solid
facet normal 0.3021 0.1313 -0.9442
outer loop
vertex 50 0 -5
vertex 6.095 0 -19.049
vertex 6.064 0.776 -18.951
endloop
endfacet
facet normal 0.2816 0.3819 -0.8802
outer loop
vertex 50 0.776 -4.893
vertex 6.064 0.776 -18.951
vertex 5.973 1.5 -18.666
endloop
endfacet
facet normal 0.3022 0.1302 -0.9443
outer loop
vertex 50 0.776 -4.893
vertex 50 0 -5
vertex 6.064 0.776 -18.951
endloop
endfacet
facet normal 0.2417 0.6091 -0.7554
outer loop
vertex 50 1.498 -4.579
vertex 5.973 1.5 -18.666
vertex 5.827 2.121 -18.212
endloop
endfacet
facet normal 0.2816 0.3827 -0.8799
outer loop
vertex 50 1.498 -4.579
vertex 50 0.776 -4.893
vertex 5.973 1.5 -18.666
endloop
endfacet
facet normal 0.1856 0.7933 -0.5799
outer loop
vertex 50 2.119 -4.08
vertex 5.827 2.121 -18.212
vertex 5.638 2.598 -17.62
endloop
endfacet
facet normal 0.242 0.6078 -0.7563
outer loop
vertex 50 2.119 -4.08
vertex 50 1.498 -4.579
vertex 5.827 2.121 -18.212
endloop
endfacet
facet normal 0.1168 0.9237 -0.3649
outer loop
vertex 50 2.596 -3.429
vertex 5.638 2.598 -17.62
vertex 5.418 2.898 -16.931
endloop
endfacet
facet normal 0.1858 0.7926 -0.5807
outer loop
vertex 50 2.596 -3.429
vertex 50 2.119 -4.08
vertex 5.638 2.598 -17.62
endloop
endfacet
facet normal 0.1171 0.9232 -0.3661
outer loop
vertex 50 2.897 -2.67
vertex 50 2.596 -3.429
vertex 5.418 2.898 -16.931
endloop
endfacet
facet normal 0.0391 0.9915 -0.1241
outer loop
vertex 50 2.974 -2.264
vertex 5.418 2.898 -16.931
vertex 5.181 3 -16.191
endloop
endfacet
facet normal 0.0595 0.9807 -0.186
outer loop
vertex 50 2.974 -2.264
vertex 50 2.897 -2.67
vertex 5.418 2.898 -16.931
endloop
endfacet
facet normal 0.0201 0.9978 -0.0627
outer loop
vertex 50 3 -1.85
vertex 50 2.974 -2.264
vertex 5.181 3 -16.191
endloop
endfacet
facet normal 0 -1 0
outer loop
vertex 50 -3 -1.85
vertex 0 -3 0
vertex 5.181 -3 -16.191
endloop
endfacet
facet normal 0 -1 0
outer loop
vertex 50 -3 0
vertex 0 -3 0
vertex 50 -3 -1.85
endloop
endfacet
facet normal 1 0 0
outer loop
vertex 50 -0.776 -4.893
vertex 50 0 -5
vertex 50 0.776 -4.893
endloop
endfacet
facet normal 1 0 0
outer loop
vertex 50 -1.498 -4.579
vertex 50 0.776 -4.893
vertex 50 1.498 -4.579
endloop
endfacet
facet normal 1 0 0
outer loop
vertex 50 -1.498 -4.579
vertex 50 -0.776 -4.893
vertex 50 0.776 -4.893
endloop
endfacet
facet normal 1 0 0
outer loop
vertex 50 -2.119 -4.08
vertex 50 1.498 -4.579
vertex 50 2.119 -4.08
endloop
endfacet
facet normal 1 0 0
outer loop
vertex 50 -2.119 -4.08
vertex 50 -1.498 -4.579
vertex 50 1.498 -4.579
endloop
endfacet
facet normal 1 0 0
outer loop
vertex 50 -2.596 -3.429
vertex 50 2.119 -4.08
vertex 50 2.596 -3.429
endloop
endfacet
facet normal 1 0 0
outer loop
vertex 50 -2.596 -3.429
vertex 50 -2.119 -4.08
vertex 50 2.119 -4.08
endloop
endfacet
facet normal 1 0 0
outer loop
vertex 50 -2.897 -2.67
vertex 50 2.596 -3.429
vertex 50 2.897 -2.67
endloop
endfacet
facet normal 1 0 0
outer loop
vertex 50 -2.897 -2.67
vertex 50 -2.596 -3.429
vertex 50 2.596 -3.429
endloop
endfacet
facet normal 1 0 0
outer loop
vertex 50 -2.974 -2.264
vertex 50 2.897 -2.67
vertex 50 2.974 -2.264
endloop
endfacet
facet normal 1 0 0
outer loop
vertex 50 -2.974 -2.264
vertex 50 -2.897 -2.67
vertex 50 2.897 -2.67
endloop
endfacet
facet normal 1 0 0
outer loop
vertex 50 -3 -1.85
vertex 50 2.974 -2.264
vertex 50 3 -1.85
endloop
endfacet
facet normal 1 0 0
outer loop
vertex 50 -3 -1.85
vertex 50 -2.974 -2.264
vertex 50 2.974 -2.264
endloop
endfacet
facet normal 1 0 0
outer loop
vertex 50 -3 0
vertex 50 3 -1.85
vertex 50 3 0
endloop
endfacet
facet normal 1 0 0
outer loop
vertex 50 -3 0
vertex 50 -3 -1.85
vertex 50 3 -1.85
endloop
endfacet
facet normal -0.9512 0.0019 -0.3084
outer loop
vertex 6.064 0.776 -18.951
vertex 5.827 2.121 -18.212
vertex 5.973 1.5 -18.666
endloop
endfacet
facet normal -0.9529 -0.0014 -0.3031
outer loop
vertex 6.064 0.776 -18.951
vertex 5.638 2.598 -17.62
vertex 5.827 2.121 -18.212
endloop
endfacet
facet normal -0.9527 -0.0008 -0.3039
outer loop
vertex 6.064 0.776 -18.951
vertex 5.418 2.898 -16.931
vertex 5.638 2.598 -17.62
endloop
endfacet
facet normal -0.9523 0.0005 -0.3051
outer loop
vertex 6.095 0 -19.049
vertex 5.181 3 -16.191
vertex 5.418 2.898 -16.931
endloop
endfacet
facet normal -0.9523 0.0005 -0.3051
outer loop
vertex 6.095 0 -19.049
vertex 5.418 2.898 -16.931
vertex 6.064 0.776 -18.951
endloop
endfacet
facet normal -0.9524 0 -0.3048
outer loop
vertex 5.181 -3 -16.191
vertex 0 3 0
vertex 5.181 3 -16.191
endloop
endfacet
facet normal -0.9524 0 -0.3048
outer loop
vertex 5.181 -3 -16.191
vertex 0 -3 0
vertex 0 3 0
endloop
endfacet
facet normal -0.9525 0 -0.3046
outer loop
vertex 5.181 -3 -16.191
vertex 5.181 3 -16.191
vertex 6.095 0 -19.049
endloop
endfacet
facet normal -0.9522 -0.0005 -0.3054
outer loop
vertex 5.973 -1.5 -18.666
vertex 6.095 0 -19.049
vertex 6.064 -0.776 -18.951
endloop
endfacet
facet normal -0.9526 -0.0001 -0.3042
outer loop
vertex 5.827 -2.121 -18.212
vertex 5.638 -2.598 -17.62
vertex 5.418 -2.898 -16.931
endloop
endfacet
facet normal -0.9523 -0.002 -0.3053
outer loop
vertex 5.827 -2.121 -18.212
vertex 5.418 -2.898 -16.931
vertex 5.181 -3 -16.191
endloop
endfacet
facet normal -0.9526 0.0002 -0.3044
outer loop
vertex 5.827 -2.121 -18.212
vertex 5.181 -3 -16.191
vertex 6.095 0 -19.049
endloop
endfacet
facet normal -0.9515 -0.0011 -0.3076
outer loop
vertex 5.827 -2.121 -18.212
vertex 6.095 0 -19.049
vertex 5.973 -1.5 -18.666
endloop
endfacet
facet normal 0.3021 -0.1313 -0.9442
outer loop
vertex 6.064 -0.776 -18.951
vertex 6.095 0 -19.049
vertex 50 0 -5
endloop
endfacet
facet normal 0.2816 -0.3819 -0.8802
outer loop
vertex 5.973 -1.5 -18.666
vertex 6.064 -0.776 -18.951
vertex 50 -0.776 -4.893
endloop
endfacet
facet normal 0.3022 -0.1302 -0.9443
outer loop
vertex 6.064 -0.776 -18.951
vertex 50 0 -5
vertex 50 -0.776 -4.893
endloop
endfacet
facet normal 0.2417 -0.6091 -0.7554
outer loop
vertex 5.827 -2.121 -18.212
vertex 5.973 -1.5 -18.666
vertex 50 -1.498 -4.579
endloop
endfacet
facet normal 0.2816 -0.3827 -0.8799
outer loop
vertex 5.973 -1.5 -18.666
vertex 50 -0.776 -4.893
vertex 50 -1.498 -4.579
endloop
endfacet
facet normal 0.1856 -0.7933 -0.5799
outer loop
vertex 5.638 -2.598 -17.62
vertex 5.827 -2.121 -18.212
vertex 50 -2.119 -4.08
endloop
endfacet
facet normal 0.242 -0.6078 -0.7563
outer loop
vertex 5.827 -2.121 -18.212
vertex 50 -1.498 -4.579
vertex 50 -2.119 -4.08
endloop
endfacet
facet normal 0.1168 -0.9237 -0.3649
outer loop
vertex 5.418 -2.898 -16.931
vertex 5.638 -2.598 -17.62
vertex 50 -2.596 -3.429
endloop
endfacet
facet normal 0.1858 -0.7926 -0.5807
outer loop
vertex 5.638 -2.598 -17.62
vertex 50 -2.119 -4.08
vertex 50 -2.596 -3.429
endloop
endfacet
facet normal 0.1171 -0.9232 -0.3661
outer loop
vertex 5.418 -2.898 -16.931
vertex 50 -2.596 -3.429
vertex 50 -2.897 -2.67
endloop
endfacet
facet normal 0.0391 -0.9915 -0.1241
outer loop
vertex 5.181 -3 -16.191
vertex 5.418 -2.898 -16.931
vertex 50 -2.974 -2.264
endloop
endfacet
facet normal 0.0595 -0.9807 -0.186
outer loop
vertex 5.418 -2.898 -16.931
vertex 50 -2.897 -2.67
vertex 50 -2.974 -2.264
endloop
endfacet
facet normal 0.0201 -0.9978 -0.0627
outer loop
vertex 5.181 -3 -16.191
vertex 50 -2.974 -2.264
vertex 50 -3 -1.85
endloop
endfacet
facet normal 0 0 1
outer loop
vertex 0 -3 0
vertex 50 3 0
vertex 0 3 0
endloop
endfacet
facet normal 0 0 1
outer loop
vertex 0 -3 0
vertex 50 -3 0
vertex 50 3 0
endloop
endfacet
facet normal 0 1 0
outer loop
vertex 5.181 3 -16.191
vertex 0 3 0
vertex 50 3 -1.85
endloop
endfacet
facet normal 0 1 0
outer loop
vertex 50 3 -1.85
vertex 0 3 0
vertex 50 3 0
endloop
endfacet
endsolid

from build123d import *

# Parameters (mm, degrees)
F1_DEPTH = 3
F2_R     = 2.99999


# Not quite as in the source:
# - a fillet or chamfer is up to 0.001 mm smaller than in the source, because OpenCascade refuses the exact size


with BuildPart() as f1:
    # F0 (on Front) → F1 (new body, symmetric)
    with BuildSketch(Plane.XZ):
        Polygon((50, 0), (0, 0), (6.0951397114, -19.0486028857), (50, -5), align=None)
    extrude(amount=F1_DEPTH, both=True)

    # F2 (radius 3 in the source; OpenCascade refuses exactly that, so slightly less here)
    f2_edges = [f1.edges().sort_by_distance(p)[0] for p in [
        (28.04757, -3, -12.024301),
        (28.04757, 3, -12.024301),
    ]]
    fillet(f2_edges, radius=F2_R)


solid = f1.part
